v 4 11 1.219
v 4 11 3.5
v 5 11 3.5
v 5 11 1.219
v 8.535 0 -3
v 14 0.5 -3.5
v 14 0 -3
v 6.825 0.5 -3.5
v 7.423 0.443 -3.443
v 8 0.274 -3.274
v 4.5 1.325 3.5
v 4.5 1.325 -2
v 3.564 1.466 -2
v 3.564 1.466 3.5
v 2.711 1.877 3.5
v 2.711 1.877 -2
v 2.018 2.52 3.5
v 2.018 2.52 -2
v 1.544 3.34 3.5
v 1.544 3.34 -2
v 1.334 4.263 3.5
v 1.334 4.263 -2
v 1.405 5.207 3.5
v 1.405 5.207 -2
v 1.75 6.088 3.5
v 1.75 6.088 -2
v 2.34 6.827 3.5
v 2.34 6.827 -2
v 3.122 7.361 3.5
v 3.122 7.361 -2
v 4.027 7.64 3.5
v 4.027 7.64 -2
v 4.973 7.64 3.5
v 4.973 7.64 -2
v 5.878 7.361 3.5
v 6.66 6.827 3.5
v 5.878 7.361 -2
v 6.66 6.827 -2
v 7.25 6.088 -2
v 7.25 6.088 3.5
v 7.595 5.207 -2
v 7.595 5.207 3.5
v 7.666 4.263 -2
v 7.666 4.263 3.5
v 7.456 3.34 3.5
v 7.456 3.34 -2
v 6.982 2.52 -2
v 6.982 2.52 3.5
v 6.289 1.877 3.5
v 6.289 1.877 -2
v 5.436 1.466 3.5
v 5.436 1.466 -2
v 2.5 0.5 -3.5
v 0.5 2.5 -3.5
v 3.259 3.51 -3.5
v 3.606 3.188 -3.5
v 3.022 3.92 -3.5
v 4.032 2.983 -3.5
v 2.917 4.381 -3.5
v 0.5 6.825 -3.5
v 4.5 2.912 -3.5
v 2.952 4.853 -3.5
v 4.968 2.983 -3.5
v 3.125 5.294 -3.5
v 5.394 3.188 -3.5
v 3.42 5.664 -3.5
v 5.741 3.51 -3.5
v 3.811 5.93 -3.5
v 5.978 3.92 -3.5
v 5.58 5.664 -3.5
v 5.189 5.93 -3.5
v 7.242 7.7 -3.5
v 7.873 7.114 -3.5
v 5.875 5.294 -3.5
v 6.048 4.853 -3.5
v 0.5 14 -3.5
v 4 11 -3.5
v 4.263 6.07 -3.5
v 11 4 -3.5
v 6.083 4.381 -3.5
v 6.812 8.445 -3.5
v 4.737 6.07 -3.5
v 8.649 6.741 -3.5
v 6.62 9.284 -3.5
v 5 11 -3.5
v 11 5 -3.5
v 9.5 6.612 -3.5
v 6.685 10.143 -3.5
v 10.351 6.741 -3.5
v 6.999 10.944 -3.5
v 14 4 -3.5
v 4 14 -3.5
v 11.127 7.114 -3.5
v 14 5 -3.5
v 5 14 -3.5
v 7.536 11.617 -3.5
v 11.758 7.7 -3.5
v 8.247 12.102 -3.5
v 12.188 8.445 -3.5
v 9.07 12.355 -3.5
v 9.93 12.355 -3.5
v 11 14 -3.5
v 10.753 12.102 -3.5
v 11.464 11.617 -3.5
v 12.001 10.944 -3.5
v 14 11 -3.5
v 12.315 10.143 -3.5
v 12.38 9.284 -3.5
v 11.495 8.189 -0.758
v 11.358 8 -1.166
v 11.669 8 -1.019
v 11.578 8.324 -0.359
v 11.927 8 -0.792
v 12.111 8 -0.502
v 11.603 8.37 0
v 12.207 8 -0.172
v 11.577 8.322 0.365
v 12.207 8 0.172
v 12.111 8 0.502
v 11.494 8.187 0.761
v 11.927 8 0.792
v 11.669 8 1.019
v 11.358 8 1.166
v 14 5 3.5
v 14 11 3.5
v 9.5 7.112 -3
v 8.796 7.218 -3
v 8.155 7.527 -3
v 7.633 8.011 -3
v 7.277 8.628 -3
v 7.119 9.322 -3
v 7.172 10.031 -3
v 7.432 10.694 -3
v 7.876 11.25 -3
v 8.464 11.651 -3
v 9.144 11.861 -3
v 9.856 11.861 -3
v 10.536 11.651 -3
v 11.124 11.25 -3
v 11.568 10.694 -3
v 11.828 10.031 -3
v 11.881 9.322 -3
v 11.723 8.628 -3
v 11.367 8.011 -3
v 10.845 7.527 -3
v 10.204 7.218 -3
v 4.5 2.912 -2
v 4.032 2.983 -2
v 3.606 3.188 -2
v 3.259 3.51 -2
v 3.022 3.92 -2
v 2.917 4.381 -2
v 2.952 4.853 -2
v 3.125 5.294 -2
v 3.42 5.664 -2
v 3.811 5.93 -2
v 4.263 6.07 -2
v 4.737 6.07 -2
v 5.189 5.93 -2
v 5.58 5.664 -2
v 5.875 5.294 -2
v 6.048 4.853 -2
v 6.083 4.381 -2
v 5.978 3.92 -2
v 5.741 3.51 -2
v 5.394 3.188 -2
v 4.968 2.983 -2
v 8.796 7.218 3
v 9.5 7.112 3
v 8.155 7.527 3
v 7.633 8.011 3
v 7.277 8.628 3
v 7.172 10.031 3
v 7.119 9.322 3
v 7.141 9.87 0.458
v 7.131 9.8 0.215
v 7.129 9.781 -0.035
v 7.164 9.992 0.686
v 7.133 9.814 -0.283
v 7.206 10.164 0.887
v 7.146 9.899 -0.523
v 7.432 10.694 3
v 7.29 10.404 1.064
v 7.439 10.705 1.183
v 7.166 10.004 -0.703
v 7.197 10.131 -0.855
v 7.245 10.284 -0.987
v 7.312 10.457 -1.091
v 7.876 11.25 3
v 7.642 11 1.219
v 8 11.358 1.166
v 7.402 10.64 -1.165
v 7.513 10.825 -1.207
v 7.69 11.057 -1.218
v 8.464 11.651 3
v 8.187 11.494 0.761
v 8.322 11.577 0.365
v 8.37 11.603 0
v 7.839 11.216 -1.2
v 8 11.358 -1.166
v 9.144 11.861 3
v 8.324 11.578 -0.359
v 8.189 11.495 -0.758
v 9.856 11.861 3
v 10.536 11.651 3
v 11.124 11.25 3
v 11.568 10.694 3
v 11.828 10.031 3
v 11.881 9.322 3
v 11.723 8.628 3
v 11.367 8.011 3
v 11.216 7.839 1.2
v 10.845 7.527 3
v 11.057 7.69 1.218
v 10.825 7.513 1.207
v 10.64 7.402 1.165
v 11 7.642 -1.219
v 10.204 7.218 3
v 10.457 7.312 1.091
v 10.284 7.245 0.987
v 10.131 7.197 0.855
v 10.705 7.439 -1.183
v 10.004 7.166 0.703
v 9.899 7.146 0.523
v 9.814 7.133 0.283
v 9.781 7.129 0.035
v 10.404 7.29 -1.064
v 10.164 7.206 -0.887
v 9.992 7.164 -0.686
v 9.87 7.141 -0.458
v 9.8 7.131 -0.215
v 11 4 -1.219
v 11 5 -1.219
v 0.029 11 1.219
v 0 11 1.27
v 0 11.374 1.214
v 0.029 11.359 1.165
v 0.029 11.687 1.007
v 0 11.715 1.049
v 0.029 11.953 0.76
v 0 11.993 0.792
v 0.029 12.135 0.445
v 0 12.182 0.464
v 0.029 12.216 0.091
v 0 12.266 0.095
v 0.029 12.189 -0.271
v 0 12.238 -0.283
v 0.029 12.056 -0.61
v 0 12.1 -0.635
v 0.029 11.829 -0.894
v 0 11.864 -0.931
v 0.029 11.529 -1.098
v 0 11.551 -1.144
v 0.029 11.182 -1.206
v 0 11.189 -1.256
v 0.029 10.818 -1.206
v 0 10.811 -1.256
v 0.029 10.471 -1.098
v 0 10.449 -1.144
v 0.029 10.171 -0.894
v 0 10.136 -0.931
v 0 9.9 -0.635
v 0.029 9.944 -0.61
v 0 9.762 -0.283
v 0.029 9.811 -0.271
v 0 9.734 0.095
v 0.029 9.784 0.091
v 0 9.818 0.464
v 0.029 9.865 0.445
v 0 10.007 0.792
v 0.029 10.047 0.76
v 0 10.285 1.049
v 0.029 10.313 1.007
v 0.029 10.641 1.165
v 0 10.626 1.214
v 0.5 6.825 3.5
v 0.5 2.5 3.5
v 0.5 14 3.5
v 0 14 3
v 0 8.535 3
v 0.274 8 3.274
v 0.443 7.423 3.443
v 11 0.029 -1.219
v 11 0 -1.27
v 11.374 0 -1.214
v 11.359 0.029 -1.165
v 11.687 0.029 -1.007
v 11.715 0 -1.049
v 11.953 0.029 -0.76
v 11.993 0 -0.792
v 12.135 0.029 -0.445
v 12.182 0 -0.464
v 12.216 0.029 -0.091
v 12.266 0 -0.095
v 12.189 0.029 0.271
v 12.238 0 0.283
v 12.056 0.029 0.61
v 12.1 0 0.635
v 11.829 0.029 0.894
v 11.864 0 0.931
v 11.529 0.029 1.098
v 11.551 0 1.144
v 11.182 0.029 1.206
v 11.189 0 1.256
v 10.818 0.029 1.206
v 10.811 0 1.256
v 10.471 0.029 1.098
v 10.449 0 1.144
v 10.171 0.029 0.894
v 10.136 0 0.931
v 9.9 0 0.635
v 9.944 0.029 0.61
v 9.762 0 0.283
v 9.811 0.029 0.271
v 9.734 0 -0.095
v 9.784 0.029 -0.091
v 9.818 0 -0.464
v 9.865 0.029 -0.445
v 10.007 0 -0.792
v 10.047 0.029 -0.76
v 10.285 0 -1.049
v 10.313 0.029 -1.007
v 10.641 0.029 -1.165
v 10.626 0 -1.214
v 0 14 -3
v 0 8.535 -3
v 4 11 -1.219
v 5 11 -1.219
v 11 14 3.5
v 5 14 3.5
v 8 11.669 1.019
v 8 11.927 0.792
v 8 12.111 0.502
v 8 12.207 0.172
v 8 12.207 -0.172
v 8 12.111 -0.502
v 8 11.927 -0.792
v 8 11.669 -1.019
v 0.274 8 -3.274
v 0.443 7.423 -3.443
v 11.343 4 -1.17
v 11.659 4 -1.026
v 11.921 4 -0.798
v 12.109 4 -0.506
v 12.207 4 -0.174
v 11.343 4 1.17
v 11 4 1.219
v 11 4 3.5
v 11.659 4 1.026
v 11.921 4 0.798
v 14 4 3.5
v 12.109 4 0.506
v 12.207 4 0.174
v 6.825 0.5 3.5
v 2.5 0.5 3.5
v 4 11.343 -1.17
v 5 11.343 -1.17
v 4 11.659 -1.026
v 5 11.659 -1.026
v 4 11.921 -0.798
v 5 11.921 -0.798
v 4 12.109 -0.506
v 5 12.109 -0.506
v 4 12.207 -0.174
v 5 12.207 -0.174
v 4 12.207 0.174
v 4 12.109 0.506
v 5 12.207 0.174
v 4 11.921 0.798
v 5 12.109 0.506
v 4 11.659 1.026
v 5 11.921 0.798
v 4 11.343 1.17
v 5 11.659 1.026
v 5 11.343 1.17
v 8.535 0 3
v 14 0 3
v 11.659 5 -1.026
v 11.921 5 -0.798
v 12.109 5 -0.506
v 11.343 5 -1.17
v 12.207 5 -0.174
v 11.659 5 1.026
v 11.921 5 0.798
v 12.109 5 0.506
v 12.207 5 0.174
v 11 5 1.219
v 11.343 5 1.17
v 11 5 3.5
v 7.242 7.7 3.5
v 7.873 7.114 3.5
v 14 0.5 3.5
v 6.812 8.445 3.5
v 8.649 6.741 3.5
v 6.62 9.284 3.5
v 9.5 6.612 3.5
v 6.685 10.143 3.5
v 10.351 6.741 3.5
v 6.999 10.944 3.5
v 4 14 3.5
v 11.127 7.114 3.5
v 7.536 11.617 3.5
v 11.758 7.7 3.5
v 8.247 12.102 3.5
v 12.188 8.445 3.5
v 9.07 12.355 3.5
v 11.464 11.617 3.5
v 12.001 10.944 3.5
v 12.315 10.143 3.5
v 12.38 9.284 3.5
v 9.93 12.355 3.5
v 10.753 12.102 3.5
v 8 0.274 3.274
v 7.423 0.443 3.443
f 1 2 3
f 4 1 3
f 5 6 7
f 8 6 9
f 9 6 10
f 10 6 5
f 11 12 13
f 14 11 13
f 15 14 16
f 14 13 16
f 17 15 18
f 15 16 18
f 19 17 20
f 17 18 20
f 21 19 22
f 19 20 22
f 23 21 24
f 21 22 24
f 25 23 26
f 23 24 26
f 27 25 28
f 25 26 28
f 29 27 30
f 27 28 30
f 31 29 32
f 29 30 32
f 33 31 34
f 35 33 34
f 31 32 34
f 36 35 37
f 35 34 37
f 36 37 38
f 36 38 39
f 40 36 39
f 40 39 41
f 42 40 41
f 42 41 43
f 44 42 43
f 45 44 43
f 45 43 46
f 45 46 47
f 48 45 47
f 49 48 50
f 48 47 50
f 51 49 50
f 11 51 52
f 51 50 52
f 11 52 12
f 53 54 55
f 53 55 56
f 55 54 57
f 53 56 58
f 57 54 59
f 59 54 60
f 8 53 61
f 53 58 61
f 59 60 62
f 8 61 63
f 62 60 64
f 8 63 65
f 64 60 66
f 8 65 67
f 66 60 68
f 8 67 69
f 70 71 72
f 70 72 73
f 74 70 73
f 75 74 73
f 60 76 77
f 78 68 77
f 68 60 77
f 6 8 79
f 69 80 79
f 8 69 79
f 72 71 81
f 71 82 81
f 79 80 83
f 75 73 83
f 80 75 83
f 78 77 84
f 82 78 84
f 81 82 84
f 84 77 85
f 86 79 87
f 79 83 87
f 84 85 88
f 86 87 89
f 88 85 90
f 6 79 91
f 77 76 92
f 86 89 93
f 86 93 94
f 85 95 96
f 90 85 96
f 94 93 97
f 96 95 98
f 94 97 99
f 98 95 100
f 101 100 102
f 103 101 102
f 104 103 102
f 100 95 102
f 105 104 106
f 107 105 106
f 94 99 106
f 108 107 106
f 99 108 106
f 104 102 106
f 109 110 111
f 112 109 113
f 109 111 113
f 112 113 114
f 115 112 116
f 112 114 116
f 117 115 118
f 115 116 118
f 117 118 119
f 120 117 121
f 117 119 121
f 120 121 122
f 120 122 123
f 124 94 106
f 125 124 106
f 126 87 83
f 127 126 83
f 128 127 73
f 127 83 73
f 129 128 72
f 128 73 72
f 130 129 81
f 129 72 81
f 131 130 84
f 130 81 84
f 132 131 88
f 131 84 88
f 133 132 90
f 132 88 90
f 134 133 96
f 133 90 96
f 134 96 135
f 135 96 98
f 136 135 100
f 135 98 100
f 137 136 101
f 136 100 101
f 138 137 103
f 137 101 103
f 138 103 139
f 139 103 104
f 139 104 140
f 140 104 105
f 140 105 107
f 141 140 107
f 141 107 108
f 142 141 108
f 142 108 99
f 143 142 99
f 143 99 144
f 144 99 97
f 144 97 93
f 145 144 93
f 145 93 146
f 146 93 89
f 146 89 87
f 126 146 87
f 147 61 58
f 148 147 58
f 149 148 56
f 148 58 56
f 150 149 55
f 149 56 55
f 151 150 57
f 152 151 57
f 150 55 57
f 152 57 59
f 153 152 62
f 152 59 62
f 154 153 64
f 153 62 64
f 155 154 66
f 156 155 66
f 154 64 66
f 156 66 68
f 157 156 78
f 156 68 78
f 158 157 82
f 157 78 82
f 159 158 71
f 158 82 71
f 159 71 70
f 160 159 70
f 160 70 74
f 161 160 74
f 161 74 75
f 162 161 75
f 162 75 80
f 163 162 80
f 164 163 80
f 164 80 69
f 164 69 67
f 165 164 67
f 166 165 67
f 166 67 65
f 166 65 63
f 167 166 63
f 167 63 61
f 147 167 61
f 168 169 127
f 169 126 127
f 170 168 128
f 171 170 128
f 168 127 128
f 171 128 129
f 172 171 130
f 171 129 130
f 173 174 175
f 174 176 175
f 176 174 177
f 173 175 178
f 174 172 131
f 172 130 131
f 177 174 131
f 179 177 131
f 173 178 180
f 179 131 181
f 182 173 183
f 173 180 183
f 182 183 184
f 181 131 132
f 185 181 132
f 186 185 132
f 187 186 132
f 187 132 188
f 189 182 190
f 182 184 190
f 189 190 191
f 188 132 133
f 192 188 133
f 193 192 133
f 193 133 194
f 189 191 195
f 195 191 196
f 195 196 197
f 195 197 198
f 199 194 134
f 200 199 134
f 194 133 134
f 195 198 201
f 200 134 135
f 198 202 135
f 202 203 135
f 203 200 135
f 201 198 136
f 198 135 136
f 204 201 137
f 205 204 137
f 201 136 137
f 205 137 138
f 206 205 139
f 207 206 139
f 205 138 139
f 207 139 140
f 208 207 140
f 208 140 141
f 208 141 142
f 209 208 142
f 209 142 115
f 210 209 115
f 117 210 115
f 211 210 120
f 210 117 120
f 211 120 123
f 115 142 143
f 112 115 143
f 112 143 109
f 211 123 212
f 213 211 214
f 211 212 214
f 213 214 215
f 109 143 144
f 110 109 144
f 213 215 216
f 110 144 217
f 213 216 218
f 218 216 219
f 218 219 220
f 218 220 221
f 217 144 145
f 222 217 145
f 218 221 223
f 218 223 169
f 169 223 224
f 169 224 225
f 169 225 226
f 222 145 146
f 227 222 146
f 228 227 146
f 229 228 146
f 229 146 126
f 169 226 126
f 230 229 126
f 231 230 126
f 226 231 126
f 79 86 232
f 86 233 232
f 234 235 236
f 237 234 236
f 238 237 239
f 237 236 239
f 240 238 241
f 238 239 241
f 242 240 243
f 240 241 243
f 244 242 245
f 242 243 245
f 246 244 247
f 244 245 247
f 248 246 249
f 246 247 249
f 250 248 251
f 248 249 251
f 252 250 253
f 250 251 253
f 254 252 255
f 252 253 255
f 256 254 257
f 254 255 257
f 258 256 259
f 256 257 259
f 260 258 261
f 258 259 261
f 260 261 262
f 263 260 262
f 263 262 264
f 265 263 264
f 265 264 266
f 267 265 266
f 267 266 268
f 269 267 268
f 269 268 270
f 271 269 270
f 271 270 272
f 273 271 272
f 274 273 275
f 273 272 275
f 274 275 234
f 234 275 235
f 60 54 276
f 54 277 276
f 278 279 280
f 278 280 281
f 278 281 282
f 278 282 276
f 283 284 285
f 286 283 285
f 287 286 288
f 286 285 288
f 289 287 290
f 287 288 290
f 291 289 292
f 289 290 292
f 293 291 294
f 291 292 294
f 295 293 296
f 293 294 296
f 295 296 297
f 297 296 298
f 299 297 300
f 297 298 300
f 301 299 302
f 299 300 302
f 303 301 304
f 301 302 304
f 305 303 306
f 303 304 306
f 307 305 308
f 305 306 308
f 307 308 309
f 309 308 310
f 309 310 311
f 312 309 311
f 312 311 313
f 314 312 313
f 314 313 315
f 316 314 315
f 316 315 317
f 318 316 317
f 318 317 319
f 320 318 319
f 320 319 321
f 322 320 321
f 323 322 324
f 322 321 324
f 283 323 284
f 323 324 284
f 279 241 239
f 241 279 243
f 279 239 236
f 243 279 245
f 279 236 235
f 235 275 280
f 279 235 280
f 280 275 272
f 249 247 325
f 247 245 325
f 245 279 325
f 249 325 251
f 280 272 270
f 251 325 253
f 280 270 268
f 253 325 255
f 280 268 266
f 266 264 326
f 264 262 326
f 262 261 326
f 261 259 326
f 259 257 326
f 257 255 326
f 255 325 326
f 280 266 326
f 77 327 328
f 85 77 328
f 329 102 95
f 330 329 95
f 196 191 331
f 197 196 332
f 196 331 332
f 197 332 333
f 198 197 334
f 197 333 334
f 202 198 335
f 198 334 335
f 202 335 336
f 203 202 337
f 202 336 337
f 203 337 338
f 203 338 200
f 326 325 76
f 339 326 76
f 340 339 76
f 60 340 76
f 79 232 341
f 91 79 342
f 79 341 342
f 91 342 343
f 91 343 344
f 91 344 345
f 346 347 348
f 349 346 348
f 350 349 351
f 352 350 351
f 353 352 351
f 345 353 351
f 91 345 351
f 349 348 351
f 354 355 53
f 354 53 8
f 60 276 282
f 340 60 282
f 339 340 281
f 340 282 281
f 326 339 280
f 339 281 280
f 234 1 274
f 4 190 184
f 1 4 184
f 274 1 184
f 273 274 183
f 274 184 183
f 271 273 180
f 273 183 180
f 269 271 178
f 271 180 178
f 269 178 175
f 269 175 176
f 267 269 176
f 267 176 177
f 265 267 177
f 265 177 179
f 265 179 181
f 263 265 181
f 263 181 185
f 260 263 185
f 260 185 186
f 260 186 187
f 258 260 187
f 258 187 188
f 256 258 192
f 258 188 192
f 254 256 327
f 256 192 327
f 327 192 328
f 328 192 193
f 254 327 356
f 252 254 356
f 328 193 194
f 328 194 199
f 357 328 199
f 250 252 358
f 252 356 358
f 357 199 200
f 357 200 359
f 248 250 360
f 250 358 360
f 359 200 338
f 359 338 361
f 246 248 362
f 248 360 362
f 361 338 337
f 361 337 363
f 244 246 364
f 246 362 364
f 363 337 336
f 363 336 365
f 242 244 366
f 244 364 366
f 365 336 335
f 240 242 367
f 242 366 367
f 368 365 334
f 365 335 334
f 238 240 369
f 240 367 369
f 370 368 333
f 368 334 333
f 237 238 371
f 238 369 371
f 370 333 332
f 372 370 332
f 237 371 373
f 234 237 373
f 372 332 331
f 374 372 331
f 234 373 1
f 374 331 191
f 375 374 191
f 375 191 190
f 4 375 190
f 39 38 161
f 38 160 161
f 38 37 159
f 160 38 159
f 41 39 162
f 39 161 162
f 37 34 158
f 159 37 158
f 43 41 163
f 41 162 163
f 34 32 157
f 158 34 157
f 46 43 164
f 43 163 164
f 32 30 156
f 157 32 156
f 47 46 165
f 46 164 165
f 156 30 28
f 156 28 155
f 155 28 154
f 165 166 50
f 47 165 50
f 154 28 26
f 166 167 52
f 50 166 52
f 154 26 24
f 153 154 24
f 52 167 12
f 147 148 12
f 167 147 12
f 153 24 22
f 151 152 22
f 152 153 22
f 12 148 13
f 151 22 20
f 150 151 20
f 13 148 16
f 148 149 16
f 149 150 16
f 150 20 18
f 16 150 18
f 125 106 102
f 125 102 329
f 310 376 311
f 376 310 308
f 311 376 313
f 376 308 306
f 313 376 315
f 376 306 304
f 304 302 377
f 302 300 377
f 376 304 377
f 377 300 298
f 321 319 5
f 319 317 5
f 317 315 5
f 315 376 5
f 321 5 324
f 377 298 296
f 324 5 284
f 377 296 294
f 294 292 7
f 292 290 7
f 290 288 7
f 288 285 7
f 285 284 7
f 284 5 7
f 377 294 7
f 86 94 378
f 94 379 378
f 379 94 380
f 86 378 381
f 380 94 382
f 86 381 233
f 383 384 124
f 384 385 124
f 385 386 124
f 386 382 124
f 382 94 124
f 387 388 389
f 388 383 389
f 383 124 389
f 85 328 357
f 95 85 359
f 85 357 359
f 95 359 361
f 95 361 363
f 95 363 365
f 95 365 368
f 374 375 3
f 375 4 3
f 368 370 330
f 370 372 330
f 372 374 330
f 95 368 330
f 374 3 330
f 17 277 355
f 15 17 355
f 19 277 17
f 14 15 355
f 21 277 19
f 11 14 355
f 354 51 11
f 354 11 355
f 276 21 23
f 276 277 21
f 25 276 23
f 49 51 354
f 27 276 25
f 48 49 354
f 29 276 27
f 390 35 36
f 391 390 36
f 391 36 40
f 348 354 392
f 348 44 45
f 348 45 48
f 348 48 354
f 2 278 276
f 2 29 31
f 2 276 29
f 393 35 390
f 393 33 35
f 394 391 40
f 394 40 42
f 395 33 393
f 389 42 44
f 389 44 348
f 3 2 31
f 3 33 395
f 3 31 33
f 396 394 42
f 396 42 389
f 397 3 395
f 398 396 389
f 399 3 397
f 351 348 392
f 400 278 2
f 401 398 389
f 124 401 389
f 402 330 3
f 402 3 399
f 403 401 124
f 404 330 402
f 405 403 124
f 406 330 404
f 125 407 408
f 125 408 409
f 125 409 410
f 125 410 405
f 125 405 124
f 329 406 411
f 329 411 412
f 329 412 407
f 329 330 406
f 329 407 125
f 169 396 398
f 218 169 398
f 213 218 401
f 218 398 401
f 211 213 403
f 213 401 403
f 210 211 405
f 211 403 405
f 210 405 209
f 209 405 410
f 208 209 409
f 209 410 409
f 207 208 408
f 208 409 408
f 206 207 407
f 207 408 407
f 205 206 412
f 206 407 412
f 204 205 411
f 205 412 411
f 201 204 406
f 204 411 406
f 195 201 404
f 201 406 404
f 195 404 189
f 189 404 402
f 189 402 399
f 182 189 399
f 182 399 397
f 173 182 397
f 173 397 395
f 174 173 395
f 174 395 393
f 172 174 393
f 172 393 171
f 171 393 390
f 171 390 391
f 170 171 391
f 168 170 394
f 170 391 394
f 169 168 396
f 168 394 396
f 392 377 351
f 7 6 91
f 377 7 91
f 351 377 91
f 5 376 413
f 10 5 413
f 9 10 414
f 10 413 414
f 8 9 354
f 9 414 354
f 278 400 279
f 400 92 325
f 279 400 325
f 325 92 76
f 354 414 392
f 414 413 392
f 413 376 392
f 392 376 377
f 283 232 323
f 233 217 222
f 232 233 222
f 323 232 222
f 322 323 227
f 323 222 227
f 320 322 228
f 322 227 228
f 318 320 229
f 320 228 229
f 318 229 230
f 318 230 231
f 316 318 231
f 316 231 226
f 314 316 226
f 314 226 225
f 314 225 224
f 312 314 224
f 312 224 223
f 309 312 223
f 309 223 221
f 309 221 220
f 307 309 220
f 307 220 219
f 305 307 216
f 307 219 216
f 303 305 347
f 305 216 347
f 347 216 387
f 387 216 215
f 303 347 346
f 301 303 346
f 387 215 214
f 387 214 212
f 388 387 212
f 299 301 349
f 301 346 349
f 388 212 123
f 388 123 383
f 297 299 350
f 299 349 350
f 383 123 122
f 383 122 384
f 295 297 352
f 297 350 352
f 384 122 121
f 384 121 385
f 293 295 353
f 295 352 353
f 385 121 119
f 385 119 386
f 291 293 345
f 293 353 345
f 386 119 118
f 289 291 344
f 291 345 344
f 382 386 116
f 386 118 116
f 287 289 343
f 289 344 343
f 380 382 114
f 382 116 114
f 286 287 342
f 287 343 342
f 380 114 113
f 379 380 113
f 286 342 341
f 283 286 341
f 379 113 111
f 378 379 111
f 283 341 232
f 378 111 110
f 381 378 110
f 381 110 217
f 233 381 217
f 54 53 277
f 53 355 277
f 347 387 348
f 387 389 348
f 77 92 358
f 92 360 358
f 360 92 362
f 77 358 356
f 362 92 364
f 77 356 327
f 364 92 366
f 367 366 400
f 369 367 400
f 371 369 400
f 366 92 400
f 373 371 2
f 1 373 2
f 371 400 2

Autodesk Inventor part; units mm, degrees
ref_plane "YZ Plane" through (0, 0, 0) normal (1, 0, 0) x (0, 1, 0)
ref_plane "XZ Plane" through (0, 0, 0) normal (0, 1, 0) x (-1, 0, 0)
ref_plane "XY Plane" through (0, 0, 0) normal (0, 0, 1) x (1, 0, 0)
sketch "Sketch1" plane through (0, 0, 0) normal (0, 0, 1) x (1, 0, 0)
  line L0 (0, 0) -> (14, 0)
  line L1 (14, 0) -> (14, 14)
  line L2 (14, 14) -> (0, 14)
  line L3 (0, 14) -> (0, 0)
  dimension "d0" = 14
  dimension "d1" = 14
extrude "Extrusion1" add sketch "Sketch1" along normal mid plane 7
hole "Hole1" at (9.5, 9.5, 3.5) direction (0, 0, -1) diameter 4.7752 end through all
sketch "Sketch22" plane through (0, 0, 3.5) normal (0, 0, 1) x (1, 0, 0)
  line L0 (0, 0) -> (0, 14) projected
  line L1 (14, 0) -> (0, 0) projected
  arc A0 (0.5, 0) -> (0, 0.5) centre (0, 0) ccw
  line L2 (0, 0.5) -> (0, 0)
  line L3 (0, 0) -> (0.5, 0)
  dimension "d145" = 0.5
extrude "Extrusion19" cut sketch "Sketch22" against normal through all
sketch "Sketch15" plane through (0, 0, 3.5) normal (0, 0, 1) x (1, 0, 0)
  line L0 (14, 0) -> (0, 0) projected
  line L1 (0, 0) -> (0, 14) projected
  line L2 (5, 5) -> (5, 12)
  line L3 (5, 12) -> (4, 12)
  line L4 (4, 12) -> (4, 5)
  line L5 (5, 4) -> (12, 4)
  line L6 (12, 4) -> (12, 5)
  line L7 (12, 5) -> (5, 5)
  arc A0 (0.5, 0) -> (0, 0.5) centre (0, 0) ccw projected
  line L8 (4, 5) -> (0, 5)
  line L9 (0, 5) -> (0, 0)
  line L10 (0, 0) -> (5, 0)
  line L11 (5, 0) -> (5, 4)
  point P0 (0, 7.5)
  point P1 (7.5, 0)
  point P2 (0.315, 0.3883)
  dimension "d94" = 1
  dimension "d95" = 4
  dimension "d96" = 4
  dimension "d97" = 12
extrude "sawblade" [suppressed]
chamfer "Chamfer5" distance 3 angle 45 1 edges at (14, 14, 0)
chamfer "Chamfer8" distance 0.5 angle 45 4 edges at (7.25, 0, 3.5) (0, 7.25, 3.5) (7.25, 0, -3.5) (0, 7.25, -3.5)
chamfer "Chamfer9" distance 0.5 angle 45 2 edges at (9.5, 11.8876, 3.5) (9.5, 11.8876, -3.5)
hole "Hole6" at (11, 0, 0) direction (0, 1, 0) diameter 2.4384 depth 8 tip angle 118 countersink diameter 2.54 countersink angle 120
hole "Hole7" at (0, 11, 0) direction (1, 0, 0) diameter 2.4384 depth 8 tip angle 118 countersink diameter 2.54 countersink angle 120
sketch "Sketch25" plane through (0, 0, 3.5) normal (0, 0, 1) x (1, 0, 0)
  line L0 (0.5, 14) -> (11, 14) projected
  line L1 (5, 14) -> (4, 14)
  line L2 (4, 14) -> (4, 11)
  line L3 (4, 11) -> (5, 11)
  line L4 (5, 11) -> (5, 14)
  line L5 (0, 14) -> (0, 0.5) projected
  point P0 (0, 0)
  dimension "d183" = 3
  dimension "d184" = 4
  dimension "d185" = 1
extrude "sawblade1" cut sketch "Sketch25" against normal through all
sketch "Sketch26" plane through (0, 0, 3.5) normal (0, 0, 1) x (1, 0, 0)
  line L0 (14, 5) -> (11, 5)
  line L1 (11, 5) -> (11, 4)
  line L2 (11, 4) -> (14, 4)
  line L3 (14, 4) -> (14, 5)
  line L4 (0.5, 0) -> (14, 0) projected
  point P0 (0, 0)
  dimension "d188" = 4
  dimension "d189" = 1
  dimension "d190" = 3
extrude "sawblade2" cut sketch "Sketch26" against normal through all
hole "Hole8" [suppressed]
hole "Hole9" [suppressed]
hole "Hole10" at (4.5, 4.5, 3.5) direction (0, 0, -1) diameter 6.35 depth 5.5
sketch "Sketch27" plane through (0, 0, 3.5) normal (0, 0, 1) x (1, 0, 0)
  line L0 (2.5, 0.5) -> (6.825, 0.5)
  line L1 (10, -2.675) -> (10, -7.675)
  line L2 (10, -7.675) -> (-7.675, -7.675)
  line L3 (-7.675, -7.675) -> (-7.675, 10)
  line L4 (-7.675, 10) -> (-2.675, 10)
  arc A0 (10, -2.675) -> (6.825, 0.5) centre (6.825, -2.675) ccw
  arc A1 (0.5, 6.825) -> (-2.675, 10) centre (-2.675, 6.825) ccw
  line L5 (0.5, 2.5) -> (0.5, 6.825)
  line L6 (2.5, 0.5) -> (0.5, 2.5)
  point P0 (0, 0)
  point P1 (0.5, 0.5)
  dimension "d220" = 3.175
  dimension "d222" = 0.5
  dimension "d223" = 0.5
  dimension "d225" = 5
  dimension "d226" = 2
  dimension "d227" = 2
  dimension "d228" = 10
extrude "Extrusion24" cut sketch "Sketch27" against normal through all
hole "Hole11" at (4.5, 4.5, -2) direction (0, 0, -1) diameter 3.175 end through all
equation "\"d227\" = d226"
properties part number "FOX-ME-118-03" material "Delrin, Black"
